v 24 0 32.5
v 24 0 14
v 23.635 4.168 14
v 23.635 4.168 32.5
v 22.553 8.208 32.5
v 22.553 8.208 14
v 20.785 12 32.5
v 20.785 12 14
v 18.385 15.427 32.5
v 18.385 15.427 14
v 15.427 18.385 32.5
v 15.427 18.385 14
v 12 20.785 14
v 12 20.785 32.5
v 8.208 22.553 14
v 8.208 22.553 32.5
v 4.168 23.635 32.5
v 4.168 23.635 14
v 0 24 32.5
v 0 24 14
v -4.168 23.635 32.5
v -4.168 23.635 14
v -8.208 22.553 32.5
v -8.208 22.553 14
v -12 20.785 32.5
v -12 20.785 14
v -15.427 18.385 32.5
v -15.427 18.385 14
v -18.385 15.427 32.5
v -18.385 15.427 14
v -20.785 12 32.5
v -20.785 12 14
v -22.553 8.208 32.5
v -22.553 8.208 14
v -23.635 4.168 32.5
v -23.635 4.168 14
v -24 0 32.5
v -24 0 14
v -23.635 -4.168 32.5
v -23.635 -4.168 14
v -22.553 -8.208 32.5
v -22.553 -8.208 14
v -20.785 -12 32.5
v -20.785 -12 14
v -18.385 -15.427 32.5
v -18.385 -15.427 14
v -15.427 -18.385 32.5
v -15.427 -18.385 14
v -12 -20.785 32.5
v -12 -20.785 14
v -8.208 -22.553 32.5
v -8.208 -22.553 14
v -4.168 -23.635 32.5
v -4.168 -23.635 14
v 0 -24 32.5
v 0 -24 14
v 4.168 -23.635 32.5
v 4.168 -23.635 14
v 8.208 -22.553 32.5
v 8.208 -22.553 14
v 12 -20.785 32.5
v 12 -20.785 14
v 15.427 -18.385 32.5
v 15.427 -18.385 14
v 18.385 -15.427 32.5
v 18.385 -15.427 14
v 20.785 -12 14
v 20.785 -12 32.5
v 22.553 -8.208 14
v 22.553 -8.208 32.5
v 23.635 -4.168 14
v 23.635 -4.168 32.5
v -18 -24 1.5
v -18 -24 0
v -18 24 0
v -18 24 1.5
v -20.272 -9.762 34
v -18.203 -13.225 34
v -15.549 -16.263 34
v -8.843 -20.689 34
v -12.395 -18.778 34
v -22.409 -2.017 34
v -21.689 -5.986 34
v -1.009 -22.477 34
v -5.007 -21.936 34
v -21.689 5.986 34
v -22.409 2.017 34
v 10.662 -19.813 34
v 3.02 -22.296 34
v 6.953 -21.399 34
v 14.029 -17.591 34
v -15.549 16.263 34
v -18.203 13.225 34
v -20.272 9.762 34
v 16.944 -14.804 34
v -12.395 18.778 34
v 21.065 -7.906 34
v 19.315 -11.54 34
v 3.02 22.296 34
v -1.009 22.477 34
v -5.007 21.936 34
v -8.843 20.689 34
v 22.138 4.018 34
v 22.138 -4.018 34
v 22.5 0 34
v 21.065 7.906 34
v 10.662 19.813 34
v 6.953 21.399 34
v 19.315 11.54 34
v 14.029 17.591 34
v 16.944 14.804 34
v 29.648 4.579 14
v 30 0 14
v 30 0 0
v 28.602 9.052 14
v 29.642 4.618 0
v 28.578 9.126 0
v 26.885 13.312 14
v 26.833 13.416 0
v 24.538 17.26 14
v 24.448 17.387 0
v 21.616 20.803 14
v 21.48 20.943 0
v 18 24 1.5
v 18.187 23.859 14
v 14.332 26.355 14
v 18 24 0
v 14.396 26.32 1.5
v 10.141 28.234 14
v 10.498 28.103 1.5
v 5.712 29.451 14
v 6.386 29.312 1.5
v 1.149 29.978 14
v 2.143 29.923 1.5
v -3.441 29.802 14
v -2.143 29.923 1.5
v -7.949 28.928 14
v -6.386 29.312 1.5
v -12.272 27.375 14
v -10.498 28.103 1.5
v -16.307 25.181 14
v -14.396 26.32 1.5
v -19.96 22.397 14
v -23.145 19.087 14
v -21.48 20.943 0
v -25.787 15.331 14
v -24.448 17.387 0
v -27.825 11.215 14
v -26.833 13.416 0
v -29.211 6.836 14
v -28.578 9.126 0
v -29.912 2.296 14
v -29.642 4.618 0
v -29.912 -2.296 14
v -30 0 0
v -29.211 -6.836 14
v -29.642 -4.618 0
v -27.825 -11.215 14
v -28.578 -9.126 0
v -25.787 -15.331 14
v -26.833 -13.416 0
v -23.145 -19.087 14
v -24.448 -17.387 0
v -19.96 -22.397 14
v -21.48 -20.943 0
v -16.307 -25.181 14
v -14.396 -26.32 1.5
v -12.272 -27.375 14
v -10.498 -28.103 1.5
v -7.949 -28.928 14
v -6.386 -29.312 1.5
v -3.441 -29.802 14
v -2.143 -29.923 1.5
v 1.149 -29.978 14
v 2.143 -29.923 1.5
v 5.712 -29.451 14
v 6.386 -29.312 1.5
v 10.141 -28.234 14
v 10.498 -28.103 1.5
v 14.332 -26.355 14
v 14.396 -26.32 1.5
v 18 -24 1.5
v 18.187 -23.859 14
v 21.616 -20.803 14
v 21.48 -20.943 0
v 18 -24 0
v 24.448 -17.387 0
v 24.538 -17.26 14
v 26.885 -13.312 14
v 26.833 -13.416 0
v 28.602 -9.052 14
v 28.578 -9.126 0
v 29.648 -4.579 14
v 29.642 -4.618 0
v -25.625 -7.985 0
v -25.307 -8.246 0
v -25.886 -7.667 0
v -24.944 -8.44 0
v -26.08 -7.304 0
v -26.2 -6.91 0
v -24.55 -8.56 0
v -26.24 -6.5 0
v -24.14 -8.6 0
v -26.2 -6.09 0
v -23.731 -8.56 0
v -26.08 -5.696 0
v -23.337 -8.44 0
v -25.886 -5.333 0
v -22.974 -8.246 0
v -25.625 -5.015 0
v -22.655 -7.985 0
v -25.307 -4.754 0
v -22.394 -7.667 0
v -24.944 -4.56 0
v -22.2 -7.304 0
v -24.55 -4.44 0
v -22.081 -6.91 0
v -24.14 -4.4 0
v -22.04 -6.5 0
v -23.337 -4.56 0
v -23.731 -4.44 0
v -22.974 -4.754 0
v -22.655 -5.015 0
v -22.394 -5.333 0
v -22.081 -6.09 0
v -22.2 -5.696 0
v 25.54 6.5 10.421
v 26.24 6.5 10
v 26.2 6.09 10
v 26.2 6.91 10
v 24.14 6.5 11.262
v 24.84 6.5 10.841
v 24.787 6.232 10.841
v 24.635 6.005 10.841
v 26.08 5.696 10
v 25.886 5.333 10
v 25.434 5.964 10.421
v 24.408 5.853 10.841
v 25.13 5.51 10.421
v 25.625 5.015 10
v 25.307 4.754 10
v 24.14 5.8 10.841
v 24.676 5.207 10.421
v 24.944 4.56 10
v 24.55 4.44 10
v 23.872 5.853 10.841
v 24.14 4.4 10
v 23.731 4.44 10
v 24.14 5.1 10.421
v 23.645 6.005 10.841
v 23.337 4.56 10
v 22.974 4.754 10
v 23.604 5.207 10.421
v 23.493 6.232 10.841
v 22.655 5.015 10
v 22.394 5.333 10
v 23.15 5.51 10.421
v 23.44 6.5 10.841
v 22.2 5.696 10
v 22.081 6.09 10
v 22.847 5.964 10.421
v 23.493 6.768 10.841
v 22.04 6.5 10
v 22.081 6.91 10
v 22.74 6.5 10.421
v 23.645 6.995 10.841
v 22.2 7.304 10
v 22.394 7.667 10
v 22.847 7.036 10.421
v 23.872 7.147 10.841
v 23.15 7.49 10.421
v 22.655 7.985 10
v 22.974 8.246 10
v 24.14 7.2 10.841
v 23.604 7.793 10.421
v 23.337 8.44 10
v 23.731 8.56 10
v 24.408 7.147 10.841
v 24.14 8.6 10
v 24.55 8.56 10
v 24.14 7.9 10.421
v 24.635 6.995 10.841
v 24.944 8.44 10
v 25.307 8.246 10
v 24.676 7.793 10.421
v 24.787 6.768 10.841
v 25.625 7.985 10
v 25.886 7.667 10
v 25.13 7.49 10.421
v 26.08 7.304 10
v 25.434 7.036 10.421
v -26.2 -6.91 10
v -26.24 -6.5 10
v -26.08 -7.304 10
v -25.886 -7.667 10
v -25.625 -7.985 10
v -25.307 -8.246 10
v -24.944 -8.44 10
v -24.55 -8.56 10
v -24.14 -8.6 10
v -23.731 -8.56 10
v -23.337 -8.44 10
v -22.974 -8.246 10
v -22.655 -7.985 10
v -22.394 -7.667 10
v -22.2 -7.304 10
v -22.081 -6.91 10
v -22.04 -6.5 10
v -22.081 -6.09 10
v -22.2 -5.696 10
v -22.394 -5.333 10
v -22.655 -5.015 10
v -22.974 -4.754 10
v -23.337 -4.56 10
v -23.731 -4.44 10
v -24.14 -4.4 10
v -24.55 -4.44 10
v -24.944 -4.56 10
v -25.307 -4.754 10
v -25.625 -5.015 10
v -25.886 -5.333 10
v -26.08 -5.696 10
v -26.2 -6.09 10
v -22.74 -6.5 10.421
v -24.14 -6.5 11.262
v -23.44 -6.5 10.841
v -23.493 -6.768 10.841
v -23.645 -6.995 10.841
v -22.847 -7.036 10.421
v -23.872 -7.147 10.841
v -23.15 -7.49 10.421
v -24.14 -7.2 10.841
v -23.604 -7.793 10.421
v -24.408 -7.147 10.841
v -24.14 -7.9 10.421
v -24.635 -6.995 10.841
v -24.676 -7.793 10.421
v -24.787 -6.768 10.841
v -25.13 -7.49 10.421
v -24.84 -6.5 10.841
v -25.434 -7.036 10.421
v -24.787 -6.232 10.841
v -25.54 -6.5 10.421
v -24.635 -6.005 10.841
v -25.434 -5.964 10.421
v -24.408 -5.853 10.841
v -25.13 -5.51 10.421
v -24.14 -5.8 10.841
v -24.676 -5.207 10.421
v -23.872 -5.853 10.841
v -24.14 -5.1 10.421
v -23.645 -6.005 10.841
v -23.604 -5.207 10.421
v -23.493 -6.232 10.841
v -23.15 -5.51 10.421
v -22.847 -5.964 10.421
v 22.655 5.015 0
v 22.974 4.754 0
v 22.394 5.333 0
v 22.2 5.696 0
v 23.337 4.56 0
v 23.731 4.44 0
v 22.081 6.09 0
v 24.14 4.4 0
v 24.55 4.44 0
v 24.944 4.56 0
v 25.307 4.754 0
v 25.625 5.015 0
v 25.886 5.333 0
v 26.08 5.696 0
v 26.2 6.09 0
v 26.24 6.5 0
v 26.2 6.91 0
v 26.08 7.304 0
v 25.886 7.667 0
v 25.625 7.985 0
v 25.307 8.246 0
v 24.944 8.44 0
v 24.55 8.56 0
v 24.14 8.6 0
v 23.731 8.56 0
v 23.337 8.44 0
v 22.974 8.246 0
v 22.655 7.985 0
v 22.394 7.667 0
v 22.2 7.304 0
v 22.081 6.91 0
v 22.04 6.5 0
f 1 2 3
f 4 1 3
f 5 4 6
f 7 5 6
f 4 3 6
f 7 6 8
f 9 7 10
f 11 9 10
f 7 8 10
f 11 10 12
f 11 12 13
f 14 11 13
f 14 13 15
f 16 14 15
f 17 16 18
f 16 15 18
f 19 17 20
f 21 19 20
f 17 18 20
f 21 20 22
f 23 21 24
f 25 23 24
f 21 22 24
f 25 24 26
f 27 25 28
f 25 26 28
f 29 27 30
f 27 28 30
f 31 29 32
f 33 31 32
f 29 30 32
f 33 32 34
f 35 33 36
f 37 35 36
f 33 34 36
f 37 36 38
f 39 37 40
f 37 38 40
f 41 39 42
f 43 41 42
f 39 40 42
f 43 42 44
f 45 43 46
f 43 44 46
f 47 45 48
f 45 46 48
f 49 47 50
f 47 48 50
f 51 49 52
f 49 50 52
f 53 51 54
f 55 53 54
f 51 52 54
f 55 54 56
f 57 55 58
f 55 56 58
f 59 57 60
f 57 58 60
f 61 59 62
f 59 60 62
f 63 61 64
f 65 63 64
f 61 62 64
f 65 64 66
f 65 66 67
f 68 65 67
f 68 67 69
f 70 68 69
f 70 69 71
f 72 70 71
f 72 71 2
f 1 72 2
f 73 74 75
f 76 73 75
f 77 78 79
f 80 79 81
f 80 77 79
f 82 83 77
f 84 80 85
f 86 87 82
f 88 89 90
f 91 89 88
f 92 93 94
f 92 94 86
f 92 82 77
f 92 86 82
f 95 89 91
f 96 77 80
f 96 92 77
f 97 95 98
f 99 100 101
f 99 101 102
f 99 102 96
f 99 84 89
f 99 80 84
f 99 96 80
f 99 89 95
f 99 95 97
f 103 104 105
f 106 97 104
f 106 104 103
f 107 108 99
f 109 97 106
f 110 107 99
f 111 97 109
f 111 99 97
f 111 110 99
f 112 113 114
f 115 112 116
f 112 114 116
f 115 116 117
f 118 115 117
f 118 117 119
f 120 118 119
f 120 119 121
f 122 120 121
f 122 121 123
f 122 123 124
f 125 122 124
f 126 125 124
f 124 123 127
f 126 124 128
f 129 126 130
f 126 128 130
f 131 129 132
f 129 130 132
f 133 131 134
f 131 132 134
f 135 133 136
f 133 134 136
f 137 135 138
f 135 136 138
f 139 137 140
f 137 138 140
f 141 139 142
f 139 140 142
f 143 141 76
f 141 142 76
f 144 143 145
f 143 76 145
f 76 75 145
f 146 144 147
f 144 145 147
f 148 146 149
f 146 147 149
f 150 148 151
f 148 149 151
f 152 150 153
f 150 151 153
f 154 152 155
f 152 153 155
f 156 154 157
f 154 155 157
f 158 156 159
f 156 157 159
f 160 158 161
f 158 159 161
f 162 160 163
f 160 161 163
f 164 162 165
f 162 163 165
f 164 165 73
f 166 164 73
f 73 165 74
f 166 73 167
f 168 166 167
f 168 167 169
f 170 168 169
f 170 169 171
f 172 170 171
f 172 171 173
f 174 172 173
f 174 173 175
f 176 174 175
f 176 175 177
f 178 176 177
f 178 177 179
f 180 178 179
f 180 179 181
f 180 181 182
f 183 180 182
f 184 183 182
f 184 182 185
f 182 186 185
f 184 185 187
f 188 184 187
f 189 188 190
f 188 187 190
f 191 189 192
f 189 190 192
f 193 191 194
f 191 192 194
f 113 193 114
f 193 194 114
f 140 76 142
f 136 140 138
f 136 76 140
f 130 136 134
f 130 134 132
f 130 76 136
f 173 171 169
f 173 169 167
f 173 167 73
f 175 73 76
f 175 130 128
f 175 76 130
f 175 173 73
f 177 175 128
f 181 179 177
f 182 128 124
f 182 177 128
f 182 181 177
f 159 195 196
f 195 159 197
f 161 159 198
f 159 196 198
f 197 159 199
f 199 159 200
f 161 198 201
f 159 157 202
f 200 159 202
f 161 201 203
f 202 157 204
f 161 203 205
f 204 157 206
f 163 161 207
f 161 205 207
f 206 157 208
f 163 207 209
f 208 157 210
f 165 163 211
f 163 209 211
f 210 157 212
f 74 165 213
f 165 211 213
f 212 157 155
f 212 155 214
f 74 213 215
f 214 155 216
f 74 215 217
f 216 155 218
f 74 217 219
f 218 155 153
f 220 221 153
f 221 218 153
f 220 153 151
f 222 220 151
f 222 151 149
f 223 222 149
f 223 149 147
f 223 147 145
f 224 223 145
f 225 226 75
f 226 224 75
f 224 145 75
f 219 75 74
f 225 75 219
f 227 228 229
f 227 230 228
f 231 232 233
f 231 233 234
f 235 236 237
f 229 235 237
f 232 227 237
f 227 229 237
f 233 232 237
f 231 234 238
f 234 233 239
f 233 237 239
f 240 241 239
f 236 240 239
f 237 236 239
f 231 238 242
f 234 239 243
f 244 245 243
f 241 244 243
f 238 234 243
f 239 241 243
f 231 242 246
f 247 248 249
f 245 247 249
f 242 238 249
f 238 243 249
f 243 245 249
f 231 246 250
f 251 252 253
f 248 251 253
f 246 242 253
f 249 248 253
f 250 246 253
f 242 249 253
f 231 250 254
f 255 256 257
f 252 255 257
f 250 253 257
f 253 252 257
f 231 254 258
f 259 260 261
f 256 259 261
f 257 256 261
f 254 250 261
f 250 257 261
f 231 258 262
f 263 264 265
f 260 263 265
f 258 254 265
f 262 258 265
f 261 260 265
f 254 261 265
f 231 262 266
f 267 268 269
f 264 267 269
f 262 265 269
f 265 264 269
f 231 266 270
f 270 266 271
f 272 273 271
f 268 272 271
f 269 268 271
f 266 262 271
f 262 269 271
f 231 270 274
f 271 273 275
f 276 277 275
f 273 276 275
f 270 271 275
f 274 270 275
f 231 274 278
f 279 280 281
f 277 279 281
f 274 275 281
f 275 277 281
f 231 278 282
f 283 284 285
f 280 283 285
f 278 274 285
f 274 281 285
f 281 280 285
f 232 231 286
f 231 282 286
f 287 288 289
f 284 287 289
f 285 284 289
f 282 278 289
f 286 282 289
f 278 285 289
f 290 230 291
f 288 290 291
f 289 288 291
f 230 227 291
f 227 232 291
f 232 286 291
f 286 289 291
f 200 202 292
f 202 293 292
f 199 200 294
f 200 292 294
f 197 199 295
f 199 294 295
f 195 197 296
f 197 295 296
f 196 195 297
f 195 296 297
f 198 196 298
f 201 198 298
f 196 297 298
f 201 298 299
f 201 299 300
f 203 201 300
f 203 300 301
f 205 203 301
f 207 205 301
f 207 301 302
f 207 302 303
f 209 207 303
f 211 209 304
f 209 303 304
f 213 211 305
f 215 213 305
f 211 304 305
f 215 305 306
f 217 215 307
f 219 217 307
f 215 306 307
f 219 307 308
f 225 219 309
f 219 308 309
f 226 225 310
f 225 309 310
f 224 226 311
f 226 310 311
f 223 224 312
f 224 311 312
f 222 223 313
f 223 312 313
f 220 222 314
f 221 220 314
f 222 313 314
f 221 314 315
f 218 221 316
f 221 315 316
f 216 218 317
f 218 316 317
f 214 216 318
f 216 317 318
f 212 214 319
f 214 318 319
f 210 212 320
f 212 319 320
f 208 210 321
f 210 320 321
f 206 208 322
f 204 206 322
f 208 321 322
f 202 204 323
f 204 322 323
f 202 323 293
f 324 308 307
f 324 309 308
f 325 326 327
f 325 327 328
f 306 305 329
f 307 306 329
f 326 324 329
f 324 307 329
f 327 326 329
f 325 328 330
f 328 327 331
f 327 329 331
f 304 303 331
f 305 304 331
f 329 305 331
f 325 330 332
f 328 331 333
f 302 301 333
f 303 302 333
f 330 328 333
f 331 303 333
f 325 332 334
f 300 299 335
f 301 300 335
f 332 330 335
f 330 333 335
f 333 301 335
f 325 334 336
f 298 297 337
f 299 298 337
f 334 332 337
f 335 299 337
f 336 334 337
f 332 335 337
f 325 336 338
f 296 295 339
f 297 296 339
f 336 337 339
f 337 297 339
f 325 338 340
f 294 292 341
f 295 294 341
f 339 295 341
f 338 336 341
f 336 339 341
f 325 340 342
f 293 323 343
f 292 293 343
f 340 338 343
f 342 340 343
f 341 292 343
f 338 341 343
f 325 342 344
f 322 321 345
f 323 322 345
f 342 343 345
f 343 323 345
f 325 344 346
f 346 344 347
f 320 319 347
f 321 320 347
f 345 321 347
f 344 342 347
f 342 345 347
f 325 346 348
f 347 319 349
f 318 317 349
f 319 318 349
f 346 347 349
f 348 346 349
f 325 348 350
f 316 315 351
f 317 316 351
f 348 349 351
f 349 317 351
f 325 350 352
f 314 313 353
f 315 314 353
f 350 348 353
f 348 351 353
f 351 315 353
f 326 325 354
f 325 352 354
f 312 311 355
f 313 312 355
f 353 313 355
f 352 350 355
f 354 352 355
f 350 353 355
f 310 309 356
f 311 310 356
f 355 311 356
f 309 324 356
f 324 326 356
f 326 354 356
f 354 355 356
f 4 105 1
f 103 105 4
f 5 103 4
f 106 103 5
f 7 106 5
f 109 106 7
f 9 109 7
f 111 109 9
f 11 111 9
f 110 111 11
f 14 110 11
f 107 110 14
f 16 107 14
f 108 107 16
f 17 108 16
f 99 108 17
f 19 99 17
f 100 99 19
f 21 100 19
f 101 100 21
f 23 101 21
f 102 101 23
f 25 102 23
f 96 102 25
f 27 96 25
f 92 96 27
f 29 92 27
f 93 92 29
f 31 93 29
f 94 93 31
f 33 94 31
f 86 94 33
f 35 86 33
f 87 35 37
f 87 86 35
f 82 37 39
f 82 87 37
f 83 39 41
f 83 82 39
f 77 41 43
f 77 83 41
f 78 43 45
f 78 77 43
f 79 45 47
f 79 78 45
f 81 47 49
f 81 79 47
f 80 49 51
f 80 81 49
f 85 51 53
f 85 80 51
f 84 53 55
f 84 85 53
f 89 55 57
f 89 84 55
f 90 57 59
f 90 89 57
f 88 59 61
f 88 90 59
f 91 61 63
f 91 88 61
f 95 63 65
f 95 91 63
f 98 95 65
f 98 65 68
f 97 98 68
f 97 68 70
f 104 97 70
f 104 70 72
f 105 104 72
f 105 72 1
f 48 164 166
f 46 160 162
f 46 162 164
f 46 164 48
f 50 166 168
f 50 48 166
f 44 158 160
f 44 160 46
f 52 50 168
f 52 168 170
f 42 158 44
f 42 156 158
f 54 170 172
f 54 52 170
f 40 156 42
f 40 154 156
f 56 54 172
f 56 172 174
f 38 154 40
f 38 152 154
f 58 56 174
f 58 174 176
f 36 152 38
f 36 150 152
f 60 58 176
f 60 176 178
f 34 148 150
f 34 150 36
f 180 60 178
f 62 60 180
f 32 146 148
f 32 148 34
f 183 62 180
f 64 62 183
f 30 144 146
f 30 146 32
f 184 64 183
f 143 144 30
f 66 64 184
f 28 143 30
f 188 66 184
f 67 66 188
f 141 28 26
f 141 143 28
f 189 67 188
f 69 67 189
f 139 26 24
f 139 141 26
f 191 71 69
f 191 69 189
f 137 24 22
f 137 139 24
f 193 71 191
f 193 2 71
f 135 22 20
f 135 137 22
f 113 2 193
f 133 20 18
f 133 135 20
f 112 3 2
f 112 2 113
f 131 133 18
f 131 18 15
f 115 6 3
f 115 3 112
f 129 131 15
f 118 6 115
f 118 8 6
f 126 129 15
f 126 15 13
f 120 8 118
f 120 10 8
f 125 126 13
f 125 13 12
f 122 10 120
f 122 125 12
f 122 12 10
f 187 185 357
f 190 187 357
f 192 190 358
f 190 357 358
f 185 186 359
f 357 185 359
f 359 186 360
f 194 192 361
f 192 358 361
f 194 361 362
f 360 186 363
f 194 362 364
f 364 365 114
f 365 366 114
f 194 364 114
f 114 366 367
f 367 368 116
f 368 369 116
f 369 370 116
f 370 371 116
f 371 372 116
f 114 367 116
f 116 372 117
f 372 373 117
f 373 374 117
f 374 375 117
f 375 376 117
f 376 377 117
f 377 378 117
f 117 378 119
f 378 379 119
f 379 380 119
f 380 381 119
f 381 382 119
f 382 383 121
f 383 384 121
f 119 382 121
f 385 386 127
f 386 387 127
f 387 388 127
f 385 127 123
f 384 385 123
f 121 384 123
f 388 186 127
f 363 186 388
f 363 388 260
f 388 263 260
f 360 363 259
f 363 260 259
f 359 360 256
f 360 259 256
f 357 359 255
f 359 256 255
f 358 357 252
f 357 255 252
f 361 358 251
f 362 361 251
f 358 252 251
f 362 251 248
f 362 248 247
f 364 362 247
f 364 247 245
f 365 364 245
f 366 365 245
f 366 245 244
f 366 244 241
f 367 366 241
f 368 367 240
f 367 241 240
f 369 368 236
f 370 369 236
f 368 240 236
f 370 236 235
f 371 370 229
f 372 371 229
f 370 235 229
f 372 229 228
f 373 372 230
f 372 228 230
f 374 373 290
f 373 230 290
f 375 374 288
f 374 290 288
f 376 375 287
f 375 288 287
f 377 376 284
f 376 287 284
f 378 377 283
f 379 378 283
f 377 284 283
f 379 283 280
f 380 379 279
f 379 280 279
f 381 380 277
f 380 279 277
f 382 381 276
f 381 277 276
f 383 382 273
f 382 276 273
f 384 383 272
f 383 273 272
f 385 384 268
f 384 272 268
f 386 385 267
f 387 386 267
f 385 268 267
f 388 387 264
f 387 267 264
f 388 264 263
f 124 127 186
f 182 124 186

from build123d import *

# Parameters (mm, degrees)
F0_R     = 30
F1_DEPTH = 14
F2_R     = 24
F3_DEPTH = 20
F4_SIZE  = 1.5
F6_DEPTH = 1.5
F8_D     = 4.2
F8_DEPTH = 10
F8_TIP   = 1.2618073


with BuildPart() as f1:
    # F0 (on Top) → F1 (new body)
    with BuildSketch(Plane.XY):
        Circle(F0_R)
    extrude(amount=F1_DEPTH)

    # F2 (on face) → F3 (join)
    with BuildSketch(Plane.XY.offset(14)):
        Circle(F2_R)
    extrude(amount=F3_DEPTH)

    # F4
    f4_edges = [f1.edges().sort_by_distance(p)[0] for p in [
        (-24, 0, 34),
    ]]
    chamfer(f4_edges, length=F4_SIZE)

    # F5 (on face) → F6 (cut)
    with BuildSketch(Plane(origin=(0, 0, 0), x_dir=(1, 0, 0), z_dir=(0, 0, -1))):
        with BuildLine():
            Line((18, 36.3252682028), (-18, 36.3252682028))
            Line((-18, 36.3252682028), (-18, 24))
            ThreePointArc((-18, 24), (0, 30), (18, 24))
            Line((18, 24), (18, 36.3252682028))
        make_face()
        with BuildLine():
            ThreePointArc((18, 24), (0, 30), (-18, 24))
            Line((-18, 24), (-18, -24))
            ThreePointArc((-18, -24), (0, -30), (18, -24))
            Line((18, -24), (18, 24))
        make_face()
        with BuildLine():
            ThreePointArc((18, -24), (0, -30), (-18, -24))
            Line((-18, -24), (-18, -38.8747264979))
            Line((-18, -38.8747264979), (18, -38.8747264979))
            Line((18, -38.8747264979), (18, -24))
        make_face()
    extrude(amount=-F6_DEPTH, mode=Mode.SUBTRACT)

    # F8
    with Locations(Plane(origin=(0, 0, 0), x_dir=(1, 0, 0), z_dir=(0, 0, -1))):
        with Locations((-24.1402154091, 6.5), (24.1402154091, -6.5)):
            Hole(F8_D / 2, depth=F8_DEPTH)
            with Locations((0, 0, -(F8_DEPTH + F8_TIP / 2))):  # 118° drill point
                Cone(0, F8_D / 2, F8_TIP, mode=Mode.SUBTRACT)


solid = f1.part
